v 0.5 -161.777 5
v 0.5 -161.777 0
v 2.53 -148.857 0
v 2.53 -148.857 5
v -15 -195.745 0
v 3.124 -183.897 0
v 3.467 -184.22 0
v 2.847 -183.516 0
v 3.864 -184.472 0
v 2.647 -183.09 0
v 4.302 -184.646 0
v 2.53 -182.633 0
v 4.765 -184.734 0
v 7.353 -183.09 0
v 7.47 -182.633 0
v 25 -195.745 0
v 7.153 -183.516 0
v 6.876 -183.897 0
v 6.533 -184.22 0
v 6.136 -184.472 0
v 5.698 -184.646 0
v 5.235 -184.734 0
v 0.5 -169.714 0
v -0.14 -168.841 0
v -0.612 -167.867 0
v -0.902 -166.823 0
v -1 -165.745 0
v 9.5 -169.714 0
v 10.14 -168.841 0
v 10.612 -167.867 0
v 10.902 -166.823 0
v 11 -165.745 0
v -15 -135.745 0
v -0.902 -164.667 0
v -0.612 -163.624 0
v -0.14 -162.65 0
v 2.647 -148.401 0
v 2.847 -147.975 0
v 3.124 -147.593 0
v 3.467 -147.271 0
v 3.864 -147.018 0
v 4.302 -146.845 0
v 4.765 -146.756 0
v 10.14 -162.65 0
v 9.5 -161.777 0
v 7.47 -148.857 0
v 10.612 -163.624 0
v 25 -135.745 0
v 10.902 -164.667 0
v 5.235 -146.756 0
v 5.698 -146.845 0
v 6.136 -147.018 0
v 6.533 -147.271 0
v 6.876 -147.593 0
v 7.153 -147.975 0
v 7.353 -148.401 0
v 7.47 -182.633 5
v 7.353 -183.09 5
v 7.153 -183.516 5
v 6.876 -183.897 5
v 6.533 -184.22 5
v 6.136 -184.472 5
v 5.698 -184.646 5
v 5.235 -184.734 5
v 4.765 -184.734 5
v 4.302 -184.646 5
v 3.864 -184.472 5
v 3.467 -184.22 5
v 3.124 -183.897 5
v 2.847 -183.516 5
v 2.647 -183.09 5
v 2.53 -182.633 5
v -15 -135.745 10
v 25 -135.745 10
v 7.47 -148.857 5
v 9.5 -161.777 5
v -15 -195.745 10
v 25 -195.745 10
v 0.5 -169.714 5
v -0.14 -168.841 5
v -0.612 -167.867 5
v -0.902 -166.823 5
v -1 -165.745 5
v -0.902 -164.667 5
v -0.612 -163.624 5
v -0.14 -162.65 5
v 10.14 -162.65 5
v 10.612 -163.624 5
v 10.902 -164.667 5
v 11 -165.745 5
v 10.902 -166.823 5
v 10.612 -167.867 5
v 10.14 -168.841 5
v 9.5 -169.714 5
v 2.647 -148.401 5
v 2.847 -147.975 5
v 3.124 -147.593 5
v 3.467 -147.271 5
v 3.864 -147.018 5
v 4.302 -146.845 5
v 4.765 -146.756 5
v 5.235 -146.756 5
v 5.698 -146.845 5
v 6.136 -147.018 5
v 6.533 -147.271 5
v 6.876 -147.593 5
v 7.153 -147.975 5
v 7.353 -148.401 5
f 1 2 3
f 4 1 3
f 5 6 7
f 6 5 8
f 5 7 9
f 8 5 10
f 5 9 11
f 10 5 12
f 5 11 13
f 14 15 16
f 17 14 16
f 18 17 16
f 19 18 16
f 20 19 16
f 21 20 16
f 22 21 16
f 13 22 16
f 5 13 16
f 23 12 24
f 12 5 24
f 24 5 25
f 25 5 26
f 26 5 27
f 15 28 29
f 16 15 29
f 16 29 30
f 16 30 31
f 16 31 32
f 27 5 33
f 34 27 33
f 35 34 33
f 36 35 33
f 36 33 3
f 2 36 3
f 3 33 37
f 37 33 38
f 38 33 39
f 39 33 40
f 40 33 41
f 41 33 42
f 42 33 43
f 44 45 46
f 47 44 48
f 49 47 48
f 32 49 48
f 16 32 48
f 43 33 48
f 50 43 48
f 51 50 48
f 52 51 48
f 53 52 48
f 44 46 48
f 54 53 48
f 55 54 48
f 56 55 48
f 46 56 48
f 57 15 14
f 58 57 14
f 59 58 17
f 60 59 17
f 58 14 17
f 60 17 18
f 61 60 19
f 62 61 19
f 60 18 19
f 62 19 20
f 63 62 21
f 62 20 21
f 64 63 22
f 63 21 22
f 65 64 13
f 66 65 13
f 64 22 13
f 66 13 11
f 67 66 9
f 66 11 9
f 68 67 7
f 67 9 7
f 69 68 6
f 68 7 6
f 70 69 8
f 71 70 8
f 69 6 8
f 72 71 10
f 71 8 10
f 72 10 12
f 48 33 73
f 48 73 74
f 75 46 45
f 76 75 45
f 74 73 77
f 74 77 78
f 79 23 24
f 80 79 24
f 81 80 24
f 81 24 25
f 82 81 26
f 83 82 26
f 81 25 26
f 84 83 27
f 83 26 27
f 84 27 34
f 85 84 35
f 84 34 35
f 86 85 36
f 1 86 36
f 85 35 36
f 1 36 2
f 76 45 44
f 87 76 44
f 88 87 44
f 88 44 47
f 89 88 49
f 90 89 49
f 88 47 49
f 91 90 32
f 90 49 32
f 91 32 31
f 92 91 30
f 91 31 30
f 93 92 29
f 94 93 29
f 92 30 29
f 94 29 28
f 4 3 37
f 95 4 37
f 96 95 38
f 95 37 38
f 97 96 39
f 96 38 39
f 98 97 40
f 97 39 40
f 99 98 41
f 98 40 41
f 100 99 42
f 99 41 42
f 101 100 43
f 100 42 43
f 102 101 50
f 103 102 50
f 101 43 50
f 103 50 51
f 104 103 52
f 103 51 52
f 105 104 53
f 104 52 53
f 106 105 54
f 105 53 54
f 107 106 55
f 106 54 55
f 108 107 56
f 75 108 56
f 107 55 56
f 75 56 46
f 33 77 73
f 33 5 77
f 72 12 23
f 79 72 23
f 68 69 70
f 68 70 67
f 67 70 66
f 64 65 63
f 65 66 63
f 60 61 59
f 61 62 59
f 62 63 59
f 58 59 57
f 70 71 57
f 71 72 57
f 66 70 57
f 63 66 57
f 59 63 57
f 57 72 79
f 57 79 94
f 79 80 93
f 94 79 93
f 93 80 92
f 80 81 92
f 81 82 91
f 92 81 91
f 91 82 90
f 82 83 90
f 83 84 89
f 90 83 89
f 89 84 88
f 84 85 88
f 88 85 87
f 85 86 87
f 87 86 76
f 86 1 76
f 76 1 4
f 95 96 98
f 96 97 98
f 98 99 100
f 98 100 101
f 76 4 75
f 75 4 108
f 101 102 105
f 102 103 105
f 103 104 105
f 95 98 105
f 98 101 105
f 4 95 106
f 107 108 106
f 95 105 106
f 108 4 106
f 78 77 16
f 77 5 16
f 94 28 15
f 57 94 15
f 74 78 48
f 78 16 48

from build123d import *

# Parameters (mm, degrees)
ESQUISSE2_W        = 40
ESQUISSE2_H        = 60
BOSS_EXTRU_1_DEPTH = 5
ESQUISSE3_W        = 40
ESQUISSE3_H        = 60
BOSS_EXTRU_2_DEPTH = 5


with BuildPart() as part:
    # Esquisse2 → Boss.-Extru.1 (new body)
    with BuildSketch(Plane.XY):
        with Locations((5, -165.745255904)):
            Rectangle(ESQUISSE2_W, ESQUISSE2_H)
        with BuildLine():
            Line((9.5, -169.713882871), (7.469689731, -182.633370102))
            ThreePointArc((7.469689731, -182.633370102), (5, -184.745255904), (2.530310269, -182.633370102))
            Line((2.530310269, -182.633370102), (0.5, -169.713882871))
            ThreePointArc((0.5, -169.713882871), (-1, -165.745255904), (0.5, -161.776628937))
            Line((0.5, -161.776628937), (2.530310269, -148.857141706))
            ThreePointArc((2.530310269, -148.857141706), (5, -146.745255904), (7.469689731, -148.857141706))
            Line((7.469689731, -148.857141706), (9.5, -161.776628937))
            ThreePointArc((9.5, -161.776628937), (11, -165.745255904), (9.5, -169.713882871))
        make_face(mode=Mode.SUBTRACT)
    extrude(amount=BOSS_EXTRU_1_DEPTH)

    # Esquisse3 → Boss.-Extru.2 (add)
    with BuildSketch(Plane.XY.offset(5)):
        with Locations((5, -165.745255904)):
            Rectangle(ESQUISSE3_W, ESQUISSE3_H)
    extrude(amount=BOSS_EXTRU_2_DEPTH)


solid = part.part
